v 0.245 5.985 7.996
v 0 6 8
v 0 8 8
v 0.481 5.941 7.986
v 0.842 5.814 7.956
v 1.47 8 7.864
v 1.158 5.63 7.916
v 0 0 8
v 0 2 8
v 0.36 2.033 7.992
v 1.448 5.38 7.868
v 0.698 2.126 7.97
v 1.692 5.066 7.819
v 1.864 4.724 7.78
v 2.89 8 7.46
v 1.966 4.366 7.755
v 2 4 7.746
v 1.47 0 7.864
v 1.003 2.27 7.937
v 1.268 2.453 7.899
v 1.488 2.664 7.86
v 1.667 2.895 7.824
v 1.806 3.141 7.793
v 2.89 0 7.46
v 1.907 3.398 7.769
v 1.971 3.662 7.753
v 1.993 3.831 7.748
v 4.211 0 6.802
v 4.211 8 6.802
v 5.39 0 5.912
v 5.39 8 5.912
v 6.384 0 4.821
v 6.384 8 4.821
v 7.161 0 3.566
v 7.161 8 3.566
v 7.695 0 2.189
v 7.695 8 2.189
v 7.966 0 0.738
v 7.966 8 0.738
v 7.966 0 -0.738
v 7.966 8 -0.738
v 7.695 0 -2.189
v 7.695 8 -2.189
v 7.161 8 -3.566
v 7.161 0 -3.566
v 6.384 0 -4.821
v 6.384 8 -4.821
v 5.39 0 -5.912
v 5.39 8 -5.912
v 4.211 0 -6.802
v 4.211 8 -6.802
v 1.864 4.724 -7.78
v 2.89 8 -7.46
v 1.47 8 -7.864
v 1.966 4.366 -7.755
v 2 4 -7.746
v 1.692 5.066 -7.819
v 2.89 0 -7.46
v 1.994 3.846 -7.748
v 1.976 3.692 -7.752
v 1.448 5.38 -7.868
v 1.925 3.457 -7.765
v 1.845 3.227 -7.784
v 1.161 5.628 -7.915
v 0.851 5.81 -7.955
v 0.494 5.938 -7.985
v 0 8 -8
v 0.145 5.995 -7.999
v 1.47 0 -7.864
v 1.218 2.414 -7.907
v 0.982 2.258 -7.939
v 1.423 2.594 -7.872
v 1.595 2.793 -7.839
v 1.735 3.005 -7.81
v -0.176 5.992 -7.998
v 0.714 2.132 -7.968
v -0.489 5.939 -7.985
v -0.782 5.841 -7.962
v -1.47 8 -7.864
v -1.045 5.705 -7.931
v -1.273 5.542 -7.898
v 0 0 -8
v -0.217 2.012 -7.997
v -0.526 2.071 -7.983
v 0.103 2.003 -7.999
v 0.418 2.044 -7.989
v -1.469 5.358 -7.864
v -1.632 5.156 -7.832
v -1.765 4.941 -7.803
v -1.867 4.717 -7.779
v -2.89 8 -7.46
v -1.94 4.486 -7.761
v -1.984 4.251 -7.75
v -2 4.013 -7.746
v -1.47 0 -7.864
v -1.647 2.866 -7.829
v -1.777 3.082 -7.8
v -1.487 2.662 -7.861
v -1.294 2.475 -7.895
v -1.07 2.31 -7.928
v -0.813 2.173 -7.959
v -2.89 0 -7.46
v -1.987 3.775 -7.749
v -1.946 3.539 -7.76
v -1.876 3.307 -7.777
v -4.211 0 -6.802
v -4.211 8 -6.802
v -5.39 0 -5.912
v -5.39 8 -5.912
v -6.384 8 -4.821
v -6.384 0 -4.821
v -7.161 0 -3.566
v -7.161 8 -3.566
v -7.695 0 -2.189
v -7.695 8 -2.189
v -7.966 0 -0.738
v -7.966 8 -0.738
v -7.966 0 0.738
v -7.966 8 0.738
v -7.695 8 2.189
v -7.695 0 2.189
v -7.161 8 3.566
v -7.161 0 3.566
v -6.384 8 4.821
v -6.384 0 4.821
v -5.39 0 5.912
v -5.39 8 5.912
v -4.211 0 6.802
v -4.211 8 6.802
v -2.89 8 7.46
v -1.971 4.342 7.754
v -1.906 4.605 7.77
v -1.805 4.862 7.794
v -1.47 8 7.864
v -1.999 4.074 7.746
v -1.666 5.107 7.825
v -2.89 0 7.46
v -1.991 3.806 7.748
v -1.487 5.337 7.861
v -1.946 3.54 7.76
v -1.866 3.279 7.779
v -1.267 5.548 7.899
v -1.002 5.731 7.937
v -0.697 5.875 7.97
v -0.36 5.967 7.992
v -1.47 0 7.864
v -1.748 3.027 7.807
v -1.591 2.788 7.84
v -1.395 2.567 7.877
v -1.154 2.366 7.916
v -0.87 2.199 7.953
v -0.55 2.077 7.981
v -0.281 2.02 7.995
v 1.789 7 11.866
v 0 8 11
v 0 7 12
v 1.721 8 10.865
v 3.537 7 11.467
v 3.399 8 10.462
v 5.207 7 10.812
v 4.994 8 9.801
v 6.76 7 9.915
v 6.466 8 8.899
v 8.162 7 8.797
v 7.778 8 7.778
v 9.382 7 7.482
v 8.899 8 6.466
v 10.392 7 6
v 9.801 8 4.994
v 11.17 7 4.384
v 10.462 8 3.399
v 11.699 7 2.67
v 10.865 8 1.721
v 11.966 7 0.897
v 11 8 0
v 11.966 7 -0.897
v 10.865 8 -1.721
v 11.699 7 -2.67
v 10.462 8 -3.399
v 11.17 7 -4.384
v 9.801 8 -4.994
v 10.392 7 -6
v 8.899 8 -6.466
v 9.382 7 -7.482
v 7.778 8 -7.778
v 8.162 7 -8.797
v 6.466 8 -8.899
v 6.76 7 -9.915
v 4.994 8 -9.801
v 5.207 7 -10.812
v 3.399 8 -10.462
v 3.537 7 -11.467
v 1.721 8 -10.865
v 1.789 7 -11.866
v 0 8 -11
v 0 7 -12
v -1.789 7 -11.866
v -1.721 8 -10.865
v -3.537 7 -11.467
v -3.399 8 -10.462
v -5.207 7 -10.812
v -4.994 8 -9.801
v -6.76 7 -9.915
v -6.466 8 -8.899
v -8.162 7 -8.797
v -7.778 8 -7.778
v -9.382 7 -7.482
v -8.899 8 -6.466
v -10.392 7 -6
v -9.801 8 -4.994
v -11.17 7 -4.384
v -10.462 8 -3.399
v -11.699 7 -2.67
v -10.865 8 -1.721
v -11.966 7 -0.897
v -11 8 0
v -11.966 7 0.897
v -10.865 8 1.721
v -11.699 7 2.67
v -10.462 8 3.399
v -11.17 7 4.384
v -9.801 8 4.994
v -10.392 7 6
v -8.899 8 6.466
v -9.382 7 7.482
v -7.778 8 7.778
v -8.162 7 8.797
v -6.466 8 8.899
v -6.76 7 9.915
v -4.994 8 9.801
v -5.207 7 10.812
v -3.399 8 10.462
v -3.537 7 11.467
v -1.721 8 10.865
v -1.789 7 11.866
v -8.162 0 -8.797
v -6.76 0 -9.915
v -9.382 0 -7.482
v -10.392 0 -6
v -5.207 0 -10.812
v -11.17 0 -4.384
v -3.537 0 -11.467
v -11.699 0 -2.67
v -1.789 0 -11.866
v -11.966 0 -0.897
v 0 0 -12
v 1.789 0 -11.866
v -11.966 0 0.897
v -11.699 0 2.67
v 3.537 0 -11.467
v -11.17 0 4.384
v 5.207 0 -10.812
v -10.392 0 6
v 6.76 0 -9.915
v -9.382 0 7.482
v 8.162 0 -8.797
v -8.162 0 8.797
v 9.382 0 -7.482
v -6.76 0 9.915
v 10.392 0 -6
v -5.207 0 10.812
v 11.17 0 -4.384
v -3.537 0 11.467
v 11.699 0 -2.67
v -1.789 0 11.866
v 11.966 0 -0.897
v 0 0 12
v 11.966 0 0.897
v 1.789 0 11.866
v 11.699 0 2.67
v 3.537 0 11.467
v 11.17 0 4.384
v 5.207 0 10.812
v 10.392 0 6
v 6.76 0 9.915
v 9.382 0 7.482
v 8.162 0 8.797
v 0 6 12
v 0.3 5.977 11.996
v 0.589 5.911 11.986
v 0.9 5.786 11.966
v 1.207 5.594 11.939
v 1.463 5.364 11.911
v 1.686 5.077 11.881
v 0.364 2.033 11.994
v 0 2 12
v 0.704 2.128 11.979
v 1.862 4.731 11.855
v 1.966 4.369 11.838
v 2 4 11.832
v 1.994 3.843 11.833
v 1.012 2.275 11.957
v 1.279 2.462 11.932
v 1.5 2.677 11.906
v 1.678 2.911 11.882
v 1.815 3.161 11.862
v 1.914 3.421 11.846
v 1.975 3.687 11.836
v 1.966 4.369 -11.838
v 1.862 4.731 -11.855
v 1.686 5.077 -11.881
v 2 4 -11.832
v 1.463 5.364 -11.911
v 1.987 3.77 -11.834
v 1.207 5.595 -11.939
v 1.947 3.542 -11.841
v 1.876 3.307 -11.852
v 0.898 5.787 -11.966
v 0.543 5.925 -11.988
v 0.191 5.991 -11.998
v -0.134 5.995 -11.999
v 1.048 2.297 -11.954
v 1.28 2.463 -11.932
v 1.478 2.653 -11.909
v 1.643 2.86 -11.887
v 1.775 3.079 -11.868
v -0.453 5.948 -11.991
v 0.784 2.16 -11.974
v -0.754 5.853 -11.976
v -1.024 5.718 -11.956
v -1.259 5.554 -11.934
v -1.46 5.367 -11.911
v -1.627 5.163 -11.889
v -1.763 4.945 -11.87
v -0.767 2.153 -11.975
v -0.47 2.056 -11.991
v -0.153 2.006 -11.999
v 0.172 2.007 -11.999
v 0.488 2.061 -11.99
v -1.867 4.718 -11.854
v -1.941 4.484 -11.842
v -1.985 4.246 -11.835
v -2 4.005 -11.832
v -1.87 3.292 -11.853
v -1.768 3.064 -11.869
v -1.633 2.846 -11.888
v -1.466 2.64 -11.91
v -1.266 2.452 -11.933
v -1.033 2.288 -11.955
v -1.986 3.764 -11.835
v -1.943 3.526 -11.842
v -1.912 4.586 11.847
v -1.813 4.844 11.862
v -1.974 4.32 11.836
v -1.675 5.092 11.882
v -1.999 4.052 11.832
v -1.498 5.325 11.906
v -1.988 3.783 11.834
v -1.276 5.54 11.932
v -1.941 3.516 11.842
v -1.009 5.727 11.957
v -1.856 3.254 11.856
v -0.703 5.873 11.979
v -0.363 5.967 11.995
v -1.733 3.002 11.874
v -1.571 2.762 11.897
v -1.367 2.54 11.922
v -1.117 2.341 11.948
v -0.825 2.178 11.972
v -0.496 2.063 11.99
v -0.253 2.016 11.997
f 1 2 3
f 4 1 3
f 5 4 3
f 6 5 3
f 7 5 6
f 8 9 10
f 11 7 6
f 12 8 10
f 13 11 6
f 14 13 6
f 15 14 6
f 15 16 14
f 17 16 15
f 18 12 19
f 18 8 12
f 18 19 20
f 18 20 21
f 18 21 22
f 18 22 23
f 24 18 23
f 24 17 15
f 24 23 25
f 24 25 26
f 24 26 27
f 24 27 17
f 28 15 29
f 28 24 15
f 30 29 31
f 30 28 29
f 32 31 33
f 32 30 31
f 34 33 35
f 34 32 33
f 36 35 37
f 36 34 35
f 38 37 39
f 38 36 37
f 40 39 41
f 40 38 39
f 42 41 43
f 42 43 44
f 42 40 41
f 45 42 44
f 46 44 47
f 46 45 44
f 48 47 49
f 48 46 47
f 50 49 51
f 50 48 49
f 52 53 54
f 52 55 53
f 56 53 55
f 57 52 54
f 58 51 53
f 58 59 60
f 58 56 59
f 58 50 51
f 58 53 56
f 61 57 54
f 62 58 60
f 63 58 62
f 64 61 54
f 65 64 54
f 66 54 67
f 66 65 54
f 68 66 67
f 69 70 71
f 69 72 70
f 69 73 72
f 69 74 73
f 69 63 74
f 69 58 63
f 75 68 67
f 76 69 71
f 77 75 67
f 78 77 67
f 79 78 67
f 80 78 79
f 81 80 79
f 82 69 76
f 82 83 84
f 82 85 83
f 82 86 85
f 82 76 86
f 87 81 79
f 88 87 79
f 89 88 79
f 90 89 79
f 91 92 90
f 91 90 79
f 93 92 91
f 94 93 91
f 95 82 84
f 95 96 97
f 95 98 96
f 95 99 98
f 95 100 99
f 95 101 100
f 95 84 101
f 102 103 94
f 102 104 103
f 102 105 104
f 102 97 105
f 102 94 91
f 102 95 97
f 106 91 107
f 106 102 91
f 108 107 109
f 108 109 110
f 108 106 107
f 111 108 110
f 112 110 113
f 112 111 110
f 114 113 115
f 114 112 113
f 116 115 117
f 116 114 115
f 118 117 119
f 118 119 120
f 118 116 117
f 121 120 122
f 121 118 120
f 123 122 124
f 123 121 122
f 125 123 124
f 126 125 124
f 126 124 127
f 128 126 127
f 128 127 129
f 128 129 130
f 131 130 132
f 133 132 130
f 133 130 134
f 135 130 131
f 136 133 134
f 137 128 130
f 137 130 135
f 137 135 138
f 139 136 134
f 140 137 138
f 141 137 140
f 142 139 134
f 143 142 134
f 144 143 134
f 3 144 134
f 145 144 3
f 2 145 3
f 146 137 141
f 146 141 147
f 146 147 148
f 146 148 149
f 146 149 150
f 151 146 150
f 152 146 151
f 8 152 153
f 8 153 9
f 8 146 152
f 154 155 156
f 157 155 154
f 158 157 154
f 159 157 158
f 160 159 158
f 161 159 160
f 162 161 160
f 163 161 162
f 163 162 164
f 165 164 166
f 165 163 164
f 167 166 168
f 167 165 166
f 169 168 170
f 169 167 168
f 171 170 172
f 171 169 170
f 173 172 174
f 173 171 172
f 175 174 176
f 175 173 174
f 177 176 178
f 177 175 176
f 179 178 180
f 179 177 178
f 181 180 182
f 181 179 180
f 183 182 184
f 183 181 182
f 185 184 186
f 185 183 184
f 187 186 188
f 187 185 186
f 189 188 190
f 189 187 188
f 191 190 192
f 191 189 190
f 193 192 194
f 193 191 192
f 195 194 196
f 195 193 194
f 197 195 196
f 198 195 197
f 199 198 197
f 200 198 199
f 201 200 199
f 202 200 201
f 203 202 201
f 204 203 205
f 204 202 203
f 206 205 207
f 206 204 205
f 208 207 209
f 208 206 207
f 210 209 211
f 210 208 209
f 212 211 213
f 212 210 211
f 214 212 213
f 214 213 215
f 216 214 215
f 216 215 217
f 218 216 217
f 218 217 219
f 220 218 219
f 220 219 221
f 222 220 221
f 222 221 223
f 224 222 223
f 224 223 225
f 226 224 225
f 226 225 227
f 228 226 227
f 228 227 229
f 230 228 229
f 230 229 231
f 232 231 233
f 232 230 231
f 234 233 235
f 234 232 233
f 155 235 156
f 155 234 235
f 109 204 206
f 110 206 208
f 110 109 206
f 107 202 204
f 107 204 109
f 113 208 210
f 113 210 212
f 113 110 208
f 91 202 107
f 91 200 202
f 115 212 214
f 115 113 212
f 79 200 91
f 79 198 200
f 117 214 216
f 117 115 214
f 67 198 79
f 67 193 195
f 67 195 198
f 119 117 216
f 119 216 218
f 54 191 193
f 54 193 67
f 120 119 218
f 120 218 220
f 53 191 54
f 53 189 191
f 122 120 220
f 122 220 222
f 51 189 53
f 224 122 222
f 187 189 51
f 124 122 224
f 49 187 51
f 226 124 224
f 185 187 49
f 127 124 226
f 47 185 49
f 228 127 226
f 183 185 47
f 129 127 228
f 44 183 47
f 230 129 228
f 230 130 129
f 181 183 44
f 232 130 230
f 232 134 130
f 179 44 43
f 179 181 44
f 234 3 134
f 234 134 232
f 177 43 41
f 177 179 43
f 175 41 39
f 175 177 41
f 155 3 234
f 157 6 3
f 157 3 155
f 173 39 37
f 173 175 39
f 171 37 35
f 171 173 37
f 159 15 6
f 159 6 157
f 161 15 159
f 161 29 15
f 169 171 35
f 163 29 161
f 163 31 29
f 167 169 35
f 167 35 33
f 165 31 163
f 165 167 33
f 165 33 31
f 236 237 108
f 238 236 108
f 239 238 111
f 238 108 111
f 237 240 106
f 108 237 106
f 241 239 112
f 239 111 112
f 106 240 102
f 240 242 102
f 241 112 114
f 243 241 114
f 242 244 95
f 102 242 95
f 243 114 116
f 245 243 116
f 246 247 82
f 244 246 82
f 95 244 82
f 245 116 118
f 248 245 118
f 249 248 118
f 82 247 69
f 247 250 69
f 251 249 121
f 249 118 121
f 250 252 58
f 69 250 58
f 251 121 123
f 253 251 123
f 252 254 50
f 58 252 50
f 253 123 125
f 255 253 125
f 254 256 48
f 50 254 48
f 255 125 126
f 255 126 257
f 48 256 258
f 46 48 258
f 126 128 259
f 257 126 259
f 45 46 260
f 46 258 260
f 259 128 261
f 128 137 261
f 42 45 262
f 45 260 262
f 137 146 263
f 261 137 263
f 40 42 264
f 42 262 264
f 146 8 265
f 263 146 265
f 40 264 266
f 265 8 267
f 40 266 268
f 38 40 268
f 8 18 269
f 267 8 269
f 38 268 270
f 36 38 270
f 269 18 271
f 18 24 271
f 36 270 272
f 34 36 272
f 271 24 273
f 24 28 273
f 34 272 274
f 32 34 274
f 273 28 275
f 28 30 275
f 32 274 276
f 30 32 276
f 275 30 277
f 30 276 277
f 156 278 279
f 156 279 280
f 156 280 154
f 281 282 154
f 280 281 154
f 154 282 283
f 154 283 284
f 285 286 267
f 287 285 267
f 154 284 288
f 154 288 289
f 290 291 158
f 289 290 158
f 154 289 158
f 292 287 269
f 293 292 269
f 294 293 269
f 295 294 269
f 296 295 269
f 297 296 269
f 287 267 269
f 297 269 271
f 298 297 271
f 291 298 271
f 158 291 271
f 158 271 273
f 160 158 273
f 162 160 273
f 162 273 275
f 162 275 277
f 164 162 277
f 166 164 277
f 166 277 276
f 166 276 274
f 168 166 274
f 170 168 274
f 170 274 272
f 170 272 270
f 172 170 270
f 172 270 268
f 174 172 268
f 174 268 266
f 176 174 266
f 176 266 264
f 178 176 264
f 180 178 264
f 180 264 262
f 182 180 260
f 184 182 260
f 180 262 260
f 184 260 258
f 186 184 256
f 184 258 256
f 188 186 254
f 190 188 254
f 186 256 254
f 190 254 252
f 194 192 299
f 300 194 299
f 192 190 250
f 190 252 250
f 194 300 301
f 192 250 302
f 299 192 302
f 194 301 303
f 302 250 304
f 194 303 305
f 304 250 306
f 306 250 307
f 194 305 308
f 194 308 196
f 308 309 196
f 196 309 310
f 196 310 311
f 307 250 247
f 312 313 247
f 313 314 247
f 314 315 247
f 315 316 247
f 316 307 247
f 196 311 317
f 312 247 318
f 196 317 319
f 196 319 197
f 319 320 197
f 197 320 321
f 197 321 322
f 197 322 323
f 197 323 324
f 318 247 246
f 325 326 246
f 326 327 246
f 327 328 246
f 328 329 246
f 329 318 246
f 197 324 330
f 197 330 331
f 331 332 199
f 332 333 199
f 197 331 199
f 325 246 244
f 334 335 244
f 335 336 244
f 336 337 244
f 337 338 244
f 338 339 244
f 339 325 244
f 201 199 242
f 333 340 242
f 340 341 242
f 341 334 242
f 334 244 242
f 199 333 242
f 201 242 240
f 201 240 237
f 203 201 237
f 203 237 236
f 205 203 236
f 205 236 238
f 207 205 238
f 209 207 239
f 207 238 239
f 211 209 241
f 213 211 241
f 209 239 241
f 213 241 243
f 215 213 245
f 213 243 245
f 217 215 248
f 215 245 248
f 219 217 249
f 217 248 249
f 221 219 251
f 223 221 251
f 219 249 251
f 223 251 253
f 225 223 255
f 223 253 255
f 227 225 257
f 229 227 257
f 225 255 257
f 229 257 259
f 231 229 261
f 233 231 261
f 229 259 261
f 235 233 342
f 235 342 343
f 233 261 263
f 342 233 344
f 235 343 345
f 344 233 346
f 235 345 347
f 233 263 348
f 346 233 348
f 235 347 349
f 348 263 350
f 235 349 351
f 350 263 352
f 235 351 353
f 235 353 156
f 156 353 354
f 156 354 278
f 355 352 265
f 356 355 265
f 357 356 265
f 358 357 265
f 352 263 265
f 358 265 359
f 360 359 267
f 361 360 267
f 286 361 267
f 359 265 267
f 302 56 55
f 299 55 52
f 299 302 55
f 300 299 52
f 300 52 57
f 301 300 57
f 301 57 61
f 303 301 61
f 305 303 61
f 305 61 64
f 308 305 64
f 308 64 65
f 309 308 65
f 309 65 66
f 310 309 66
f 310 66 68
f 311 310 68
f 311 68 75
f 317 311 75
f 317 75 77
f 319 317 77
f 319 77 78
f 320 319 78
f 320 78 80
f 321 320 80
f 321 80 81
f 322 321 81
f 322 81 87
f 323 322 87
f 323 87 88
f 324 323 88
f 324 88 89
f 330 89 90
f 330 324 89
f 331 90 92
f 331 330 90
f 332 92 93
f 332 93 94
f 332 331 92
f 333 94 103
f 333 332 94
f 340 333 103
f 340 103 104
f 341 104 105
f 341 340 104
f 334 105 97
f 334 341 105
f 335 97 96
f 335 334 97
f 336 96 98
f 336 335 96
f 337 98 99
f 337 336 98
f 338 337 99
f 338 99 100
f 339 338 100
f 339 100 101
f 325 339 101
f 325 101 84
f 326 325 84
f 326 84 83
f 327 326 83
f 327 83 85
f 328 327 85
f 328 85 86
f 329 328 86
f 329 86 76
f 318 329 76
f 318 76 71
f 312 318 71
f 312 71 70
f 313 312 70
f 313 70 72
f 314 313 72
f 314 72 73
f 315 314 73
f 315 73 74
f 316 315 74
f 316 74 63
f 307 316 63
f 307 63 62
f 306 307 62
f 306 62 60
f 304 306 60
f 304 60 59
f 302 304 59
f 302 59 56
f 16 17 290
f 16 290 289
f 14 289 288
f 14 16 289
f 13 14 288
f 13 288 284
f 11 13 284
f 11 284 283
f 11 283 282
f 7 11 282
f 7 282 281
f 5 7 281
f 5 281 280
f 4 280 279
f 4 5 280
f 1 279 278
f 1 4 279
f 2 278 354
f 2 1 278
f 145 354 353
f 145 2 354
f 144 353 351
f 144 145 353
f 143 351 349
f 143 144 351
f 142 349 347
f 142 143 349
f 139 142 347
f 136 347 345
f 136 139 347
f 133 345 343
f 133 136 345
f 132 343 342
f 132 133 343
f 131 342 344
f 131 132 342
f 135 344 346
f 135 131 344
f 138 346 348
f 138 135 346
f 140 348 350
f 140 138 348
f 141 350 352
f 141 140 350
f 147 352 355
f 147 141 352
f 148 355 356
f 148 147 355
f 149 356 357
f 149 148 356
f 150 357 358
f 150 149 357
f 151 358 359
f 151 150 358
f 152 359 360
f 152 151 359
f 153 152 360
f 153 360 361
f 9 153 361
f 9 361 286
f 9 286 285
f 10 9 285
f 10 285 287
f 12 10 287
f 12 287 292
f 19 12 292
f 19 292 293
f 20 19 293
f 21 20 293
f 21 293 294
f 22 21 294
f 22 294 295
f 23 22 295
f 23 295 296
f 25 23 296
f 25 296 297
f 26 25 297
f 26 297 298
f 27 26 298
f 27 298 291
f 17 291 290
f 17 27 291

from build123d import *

# Parameters (mm, degrees)
SKETCH2_R               = 12
SKETCH2_R_2             = 8
BOSS_EXTRUDE1_DEPTH     = 8
CUT_EXTRUDE1_DEPTH      = 19.761663039
CUT_EXTRUDE1_DEPTH_BACK = 19.761663039
SKETCH3_R               = 2
CHAMFER1_SIZE           = 1


with BuildPart() as part:
    # Sketch2 → Boss-Extrude1 (new body)
    with BuildSketch(Plane(origin=(0, 0, 0), x_dir=(1, 0, 0), z_dir=(0, 1, 0))):
        with Locations(Location((0, 0, 0), (0, 0, 270))):
            Circle(SKETCH2_R)
        with Locations(Location((0, 0, 0), (0, 0, 270))):
            Circle(SKETCH2_R_2, mode=Mode.SUBTRACT)
    extrude(amount=BOSS_EXTRUDE1_DEPTH)

    # Sketch3 → Cut-Extrude1 (cut, two sides: drawn at the far end of the back side and taken through both)
    with BuildSketch(Plane.XY.offset(-CUT_EXTRUDE1_DEPTH_BACK)):
        with Locations((0, 4)):
            Circle(SKETCH3_R)
    extrude(amount=CUT_EXTRUDE1_DEPTH + CUT_EXTRUDE1_DEPTH_BACK, mode=Mode.SUBTRACT)

    # Chamfer1
    chamfer1_edges = [part.edges().sort_by_distance(p)[0] for p in [
        (0, 8, -12),
    ]]
    chamfer(chamfer1_edges, length=CHAMFER1_SIZE)


solid = part.part
